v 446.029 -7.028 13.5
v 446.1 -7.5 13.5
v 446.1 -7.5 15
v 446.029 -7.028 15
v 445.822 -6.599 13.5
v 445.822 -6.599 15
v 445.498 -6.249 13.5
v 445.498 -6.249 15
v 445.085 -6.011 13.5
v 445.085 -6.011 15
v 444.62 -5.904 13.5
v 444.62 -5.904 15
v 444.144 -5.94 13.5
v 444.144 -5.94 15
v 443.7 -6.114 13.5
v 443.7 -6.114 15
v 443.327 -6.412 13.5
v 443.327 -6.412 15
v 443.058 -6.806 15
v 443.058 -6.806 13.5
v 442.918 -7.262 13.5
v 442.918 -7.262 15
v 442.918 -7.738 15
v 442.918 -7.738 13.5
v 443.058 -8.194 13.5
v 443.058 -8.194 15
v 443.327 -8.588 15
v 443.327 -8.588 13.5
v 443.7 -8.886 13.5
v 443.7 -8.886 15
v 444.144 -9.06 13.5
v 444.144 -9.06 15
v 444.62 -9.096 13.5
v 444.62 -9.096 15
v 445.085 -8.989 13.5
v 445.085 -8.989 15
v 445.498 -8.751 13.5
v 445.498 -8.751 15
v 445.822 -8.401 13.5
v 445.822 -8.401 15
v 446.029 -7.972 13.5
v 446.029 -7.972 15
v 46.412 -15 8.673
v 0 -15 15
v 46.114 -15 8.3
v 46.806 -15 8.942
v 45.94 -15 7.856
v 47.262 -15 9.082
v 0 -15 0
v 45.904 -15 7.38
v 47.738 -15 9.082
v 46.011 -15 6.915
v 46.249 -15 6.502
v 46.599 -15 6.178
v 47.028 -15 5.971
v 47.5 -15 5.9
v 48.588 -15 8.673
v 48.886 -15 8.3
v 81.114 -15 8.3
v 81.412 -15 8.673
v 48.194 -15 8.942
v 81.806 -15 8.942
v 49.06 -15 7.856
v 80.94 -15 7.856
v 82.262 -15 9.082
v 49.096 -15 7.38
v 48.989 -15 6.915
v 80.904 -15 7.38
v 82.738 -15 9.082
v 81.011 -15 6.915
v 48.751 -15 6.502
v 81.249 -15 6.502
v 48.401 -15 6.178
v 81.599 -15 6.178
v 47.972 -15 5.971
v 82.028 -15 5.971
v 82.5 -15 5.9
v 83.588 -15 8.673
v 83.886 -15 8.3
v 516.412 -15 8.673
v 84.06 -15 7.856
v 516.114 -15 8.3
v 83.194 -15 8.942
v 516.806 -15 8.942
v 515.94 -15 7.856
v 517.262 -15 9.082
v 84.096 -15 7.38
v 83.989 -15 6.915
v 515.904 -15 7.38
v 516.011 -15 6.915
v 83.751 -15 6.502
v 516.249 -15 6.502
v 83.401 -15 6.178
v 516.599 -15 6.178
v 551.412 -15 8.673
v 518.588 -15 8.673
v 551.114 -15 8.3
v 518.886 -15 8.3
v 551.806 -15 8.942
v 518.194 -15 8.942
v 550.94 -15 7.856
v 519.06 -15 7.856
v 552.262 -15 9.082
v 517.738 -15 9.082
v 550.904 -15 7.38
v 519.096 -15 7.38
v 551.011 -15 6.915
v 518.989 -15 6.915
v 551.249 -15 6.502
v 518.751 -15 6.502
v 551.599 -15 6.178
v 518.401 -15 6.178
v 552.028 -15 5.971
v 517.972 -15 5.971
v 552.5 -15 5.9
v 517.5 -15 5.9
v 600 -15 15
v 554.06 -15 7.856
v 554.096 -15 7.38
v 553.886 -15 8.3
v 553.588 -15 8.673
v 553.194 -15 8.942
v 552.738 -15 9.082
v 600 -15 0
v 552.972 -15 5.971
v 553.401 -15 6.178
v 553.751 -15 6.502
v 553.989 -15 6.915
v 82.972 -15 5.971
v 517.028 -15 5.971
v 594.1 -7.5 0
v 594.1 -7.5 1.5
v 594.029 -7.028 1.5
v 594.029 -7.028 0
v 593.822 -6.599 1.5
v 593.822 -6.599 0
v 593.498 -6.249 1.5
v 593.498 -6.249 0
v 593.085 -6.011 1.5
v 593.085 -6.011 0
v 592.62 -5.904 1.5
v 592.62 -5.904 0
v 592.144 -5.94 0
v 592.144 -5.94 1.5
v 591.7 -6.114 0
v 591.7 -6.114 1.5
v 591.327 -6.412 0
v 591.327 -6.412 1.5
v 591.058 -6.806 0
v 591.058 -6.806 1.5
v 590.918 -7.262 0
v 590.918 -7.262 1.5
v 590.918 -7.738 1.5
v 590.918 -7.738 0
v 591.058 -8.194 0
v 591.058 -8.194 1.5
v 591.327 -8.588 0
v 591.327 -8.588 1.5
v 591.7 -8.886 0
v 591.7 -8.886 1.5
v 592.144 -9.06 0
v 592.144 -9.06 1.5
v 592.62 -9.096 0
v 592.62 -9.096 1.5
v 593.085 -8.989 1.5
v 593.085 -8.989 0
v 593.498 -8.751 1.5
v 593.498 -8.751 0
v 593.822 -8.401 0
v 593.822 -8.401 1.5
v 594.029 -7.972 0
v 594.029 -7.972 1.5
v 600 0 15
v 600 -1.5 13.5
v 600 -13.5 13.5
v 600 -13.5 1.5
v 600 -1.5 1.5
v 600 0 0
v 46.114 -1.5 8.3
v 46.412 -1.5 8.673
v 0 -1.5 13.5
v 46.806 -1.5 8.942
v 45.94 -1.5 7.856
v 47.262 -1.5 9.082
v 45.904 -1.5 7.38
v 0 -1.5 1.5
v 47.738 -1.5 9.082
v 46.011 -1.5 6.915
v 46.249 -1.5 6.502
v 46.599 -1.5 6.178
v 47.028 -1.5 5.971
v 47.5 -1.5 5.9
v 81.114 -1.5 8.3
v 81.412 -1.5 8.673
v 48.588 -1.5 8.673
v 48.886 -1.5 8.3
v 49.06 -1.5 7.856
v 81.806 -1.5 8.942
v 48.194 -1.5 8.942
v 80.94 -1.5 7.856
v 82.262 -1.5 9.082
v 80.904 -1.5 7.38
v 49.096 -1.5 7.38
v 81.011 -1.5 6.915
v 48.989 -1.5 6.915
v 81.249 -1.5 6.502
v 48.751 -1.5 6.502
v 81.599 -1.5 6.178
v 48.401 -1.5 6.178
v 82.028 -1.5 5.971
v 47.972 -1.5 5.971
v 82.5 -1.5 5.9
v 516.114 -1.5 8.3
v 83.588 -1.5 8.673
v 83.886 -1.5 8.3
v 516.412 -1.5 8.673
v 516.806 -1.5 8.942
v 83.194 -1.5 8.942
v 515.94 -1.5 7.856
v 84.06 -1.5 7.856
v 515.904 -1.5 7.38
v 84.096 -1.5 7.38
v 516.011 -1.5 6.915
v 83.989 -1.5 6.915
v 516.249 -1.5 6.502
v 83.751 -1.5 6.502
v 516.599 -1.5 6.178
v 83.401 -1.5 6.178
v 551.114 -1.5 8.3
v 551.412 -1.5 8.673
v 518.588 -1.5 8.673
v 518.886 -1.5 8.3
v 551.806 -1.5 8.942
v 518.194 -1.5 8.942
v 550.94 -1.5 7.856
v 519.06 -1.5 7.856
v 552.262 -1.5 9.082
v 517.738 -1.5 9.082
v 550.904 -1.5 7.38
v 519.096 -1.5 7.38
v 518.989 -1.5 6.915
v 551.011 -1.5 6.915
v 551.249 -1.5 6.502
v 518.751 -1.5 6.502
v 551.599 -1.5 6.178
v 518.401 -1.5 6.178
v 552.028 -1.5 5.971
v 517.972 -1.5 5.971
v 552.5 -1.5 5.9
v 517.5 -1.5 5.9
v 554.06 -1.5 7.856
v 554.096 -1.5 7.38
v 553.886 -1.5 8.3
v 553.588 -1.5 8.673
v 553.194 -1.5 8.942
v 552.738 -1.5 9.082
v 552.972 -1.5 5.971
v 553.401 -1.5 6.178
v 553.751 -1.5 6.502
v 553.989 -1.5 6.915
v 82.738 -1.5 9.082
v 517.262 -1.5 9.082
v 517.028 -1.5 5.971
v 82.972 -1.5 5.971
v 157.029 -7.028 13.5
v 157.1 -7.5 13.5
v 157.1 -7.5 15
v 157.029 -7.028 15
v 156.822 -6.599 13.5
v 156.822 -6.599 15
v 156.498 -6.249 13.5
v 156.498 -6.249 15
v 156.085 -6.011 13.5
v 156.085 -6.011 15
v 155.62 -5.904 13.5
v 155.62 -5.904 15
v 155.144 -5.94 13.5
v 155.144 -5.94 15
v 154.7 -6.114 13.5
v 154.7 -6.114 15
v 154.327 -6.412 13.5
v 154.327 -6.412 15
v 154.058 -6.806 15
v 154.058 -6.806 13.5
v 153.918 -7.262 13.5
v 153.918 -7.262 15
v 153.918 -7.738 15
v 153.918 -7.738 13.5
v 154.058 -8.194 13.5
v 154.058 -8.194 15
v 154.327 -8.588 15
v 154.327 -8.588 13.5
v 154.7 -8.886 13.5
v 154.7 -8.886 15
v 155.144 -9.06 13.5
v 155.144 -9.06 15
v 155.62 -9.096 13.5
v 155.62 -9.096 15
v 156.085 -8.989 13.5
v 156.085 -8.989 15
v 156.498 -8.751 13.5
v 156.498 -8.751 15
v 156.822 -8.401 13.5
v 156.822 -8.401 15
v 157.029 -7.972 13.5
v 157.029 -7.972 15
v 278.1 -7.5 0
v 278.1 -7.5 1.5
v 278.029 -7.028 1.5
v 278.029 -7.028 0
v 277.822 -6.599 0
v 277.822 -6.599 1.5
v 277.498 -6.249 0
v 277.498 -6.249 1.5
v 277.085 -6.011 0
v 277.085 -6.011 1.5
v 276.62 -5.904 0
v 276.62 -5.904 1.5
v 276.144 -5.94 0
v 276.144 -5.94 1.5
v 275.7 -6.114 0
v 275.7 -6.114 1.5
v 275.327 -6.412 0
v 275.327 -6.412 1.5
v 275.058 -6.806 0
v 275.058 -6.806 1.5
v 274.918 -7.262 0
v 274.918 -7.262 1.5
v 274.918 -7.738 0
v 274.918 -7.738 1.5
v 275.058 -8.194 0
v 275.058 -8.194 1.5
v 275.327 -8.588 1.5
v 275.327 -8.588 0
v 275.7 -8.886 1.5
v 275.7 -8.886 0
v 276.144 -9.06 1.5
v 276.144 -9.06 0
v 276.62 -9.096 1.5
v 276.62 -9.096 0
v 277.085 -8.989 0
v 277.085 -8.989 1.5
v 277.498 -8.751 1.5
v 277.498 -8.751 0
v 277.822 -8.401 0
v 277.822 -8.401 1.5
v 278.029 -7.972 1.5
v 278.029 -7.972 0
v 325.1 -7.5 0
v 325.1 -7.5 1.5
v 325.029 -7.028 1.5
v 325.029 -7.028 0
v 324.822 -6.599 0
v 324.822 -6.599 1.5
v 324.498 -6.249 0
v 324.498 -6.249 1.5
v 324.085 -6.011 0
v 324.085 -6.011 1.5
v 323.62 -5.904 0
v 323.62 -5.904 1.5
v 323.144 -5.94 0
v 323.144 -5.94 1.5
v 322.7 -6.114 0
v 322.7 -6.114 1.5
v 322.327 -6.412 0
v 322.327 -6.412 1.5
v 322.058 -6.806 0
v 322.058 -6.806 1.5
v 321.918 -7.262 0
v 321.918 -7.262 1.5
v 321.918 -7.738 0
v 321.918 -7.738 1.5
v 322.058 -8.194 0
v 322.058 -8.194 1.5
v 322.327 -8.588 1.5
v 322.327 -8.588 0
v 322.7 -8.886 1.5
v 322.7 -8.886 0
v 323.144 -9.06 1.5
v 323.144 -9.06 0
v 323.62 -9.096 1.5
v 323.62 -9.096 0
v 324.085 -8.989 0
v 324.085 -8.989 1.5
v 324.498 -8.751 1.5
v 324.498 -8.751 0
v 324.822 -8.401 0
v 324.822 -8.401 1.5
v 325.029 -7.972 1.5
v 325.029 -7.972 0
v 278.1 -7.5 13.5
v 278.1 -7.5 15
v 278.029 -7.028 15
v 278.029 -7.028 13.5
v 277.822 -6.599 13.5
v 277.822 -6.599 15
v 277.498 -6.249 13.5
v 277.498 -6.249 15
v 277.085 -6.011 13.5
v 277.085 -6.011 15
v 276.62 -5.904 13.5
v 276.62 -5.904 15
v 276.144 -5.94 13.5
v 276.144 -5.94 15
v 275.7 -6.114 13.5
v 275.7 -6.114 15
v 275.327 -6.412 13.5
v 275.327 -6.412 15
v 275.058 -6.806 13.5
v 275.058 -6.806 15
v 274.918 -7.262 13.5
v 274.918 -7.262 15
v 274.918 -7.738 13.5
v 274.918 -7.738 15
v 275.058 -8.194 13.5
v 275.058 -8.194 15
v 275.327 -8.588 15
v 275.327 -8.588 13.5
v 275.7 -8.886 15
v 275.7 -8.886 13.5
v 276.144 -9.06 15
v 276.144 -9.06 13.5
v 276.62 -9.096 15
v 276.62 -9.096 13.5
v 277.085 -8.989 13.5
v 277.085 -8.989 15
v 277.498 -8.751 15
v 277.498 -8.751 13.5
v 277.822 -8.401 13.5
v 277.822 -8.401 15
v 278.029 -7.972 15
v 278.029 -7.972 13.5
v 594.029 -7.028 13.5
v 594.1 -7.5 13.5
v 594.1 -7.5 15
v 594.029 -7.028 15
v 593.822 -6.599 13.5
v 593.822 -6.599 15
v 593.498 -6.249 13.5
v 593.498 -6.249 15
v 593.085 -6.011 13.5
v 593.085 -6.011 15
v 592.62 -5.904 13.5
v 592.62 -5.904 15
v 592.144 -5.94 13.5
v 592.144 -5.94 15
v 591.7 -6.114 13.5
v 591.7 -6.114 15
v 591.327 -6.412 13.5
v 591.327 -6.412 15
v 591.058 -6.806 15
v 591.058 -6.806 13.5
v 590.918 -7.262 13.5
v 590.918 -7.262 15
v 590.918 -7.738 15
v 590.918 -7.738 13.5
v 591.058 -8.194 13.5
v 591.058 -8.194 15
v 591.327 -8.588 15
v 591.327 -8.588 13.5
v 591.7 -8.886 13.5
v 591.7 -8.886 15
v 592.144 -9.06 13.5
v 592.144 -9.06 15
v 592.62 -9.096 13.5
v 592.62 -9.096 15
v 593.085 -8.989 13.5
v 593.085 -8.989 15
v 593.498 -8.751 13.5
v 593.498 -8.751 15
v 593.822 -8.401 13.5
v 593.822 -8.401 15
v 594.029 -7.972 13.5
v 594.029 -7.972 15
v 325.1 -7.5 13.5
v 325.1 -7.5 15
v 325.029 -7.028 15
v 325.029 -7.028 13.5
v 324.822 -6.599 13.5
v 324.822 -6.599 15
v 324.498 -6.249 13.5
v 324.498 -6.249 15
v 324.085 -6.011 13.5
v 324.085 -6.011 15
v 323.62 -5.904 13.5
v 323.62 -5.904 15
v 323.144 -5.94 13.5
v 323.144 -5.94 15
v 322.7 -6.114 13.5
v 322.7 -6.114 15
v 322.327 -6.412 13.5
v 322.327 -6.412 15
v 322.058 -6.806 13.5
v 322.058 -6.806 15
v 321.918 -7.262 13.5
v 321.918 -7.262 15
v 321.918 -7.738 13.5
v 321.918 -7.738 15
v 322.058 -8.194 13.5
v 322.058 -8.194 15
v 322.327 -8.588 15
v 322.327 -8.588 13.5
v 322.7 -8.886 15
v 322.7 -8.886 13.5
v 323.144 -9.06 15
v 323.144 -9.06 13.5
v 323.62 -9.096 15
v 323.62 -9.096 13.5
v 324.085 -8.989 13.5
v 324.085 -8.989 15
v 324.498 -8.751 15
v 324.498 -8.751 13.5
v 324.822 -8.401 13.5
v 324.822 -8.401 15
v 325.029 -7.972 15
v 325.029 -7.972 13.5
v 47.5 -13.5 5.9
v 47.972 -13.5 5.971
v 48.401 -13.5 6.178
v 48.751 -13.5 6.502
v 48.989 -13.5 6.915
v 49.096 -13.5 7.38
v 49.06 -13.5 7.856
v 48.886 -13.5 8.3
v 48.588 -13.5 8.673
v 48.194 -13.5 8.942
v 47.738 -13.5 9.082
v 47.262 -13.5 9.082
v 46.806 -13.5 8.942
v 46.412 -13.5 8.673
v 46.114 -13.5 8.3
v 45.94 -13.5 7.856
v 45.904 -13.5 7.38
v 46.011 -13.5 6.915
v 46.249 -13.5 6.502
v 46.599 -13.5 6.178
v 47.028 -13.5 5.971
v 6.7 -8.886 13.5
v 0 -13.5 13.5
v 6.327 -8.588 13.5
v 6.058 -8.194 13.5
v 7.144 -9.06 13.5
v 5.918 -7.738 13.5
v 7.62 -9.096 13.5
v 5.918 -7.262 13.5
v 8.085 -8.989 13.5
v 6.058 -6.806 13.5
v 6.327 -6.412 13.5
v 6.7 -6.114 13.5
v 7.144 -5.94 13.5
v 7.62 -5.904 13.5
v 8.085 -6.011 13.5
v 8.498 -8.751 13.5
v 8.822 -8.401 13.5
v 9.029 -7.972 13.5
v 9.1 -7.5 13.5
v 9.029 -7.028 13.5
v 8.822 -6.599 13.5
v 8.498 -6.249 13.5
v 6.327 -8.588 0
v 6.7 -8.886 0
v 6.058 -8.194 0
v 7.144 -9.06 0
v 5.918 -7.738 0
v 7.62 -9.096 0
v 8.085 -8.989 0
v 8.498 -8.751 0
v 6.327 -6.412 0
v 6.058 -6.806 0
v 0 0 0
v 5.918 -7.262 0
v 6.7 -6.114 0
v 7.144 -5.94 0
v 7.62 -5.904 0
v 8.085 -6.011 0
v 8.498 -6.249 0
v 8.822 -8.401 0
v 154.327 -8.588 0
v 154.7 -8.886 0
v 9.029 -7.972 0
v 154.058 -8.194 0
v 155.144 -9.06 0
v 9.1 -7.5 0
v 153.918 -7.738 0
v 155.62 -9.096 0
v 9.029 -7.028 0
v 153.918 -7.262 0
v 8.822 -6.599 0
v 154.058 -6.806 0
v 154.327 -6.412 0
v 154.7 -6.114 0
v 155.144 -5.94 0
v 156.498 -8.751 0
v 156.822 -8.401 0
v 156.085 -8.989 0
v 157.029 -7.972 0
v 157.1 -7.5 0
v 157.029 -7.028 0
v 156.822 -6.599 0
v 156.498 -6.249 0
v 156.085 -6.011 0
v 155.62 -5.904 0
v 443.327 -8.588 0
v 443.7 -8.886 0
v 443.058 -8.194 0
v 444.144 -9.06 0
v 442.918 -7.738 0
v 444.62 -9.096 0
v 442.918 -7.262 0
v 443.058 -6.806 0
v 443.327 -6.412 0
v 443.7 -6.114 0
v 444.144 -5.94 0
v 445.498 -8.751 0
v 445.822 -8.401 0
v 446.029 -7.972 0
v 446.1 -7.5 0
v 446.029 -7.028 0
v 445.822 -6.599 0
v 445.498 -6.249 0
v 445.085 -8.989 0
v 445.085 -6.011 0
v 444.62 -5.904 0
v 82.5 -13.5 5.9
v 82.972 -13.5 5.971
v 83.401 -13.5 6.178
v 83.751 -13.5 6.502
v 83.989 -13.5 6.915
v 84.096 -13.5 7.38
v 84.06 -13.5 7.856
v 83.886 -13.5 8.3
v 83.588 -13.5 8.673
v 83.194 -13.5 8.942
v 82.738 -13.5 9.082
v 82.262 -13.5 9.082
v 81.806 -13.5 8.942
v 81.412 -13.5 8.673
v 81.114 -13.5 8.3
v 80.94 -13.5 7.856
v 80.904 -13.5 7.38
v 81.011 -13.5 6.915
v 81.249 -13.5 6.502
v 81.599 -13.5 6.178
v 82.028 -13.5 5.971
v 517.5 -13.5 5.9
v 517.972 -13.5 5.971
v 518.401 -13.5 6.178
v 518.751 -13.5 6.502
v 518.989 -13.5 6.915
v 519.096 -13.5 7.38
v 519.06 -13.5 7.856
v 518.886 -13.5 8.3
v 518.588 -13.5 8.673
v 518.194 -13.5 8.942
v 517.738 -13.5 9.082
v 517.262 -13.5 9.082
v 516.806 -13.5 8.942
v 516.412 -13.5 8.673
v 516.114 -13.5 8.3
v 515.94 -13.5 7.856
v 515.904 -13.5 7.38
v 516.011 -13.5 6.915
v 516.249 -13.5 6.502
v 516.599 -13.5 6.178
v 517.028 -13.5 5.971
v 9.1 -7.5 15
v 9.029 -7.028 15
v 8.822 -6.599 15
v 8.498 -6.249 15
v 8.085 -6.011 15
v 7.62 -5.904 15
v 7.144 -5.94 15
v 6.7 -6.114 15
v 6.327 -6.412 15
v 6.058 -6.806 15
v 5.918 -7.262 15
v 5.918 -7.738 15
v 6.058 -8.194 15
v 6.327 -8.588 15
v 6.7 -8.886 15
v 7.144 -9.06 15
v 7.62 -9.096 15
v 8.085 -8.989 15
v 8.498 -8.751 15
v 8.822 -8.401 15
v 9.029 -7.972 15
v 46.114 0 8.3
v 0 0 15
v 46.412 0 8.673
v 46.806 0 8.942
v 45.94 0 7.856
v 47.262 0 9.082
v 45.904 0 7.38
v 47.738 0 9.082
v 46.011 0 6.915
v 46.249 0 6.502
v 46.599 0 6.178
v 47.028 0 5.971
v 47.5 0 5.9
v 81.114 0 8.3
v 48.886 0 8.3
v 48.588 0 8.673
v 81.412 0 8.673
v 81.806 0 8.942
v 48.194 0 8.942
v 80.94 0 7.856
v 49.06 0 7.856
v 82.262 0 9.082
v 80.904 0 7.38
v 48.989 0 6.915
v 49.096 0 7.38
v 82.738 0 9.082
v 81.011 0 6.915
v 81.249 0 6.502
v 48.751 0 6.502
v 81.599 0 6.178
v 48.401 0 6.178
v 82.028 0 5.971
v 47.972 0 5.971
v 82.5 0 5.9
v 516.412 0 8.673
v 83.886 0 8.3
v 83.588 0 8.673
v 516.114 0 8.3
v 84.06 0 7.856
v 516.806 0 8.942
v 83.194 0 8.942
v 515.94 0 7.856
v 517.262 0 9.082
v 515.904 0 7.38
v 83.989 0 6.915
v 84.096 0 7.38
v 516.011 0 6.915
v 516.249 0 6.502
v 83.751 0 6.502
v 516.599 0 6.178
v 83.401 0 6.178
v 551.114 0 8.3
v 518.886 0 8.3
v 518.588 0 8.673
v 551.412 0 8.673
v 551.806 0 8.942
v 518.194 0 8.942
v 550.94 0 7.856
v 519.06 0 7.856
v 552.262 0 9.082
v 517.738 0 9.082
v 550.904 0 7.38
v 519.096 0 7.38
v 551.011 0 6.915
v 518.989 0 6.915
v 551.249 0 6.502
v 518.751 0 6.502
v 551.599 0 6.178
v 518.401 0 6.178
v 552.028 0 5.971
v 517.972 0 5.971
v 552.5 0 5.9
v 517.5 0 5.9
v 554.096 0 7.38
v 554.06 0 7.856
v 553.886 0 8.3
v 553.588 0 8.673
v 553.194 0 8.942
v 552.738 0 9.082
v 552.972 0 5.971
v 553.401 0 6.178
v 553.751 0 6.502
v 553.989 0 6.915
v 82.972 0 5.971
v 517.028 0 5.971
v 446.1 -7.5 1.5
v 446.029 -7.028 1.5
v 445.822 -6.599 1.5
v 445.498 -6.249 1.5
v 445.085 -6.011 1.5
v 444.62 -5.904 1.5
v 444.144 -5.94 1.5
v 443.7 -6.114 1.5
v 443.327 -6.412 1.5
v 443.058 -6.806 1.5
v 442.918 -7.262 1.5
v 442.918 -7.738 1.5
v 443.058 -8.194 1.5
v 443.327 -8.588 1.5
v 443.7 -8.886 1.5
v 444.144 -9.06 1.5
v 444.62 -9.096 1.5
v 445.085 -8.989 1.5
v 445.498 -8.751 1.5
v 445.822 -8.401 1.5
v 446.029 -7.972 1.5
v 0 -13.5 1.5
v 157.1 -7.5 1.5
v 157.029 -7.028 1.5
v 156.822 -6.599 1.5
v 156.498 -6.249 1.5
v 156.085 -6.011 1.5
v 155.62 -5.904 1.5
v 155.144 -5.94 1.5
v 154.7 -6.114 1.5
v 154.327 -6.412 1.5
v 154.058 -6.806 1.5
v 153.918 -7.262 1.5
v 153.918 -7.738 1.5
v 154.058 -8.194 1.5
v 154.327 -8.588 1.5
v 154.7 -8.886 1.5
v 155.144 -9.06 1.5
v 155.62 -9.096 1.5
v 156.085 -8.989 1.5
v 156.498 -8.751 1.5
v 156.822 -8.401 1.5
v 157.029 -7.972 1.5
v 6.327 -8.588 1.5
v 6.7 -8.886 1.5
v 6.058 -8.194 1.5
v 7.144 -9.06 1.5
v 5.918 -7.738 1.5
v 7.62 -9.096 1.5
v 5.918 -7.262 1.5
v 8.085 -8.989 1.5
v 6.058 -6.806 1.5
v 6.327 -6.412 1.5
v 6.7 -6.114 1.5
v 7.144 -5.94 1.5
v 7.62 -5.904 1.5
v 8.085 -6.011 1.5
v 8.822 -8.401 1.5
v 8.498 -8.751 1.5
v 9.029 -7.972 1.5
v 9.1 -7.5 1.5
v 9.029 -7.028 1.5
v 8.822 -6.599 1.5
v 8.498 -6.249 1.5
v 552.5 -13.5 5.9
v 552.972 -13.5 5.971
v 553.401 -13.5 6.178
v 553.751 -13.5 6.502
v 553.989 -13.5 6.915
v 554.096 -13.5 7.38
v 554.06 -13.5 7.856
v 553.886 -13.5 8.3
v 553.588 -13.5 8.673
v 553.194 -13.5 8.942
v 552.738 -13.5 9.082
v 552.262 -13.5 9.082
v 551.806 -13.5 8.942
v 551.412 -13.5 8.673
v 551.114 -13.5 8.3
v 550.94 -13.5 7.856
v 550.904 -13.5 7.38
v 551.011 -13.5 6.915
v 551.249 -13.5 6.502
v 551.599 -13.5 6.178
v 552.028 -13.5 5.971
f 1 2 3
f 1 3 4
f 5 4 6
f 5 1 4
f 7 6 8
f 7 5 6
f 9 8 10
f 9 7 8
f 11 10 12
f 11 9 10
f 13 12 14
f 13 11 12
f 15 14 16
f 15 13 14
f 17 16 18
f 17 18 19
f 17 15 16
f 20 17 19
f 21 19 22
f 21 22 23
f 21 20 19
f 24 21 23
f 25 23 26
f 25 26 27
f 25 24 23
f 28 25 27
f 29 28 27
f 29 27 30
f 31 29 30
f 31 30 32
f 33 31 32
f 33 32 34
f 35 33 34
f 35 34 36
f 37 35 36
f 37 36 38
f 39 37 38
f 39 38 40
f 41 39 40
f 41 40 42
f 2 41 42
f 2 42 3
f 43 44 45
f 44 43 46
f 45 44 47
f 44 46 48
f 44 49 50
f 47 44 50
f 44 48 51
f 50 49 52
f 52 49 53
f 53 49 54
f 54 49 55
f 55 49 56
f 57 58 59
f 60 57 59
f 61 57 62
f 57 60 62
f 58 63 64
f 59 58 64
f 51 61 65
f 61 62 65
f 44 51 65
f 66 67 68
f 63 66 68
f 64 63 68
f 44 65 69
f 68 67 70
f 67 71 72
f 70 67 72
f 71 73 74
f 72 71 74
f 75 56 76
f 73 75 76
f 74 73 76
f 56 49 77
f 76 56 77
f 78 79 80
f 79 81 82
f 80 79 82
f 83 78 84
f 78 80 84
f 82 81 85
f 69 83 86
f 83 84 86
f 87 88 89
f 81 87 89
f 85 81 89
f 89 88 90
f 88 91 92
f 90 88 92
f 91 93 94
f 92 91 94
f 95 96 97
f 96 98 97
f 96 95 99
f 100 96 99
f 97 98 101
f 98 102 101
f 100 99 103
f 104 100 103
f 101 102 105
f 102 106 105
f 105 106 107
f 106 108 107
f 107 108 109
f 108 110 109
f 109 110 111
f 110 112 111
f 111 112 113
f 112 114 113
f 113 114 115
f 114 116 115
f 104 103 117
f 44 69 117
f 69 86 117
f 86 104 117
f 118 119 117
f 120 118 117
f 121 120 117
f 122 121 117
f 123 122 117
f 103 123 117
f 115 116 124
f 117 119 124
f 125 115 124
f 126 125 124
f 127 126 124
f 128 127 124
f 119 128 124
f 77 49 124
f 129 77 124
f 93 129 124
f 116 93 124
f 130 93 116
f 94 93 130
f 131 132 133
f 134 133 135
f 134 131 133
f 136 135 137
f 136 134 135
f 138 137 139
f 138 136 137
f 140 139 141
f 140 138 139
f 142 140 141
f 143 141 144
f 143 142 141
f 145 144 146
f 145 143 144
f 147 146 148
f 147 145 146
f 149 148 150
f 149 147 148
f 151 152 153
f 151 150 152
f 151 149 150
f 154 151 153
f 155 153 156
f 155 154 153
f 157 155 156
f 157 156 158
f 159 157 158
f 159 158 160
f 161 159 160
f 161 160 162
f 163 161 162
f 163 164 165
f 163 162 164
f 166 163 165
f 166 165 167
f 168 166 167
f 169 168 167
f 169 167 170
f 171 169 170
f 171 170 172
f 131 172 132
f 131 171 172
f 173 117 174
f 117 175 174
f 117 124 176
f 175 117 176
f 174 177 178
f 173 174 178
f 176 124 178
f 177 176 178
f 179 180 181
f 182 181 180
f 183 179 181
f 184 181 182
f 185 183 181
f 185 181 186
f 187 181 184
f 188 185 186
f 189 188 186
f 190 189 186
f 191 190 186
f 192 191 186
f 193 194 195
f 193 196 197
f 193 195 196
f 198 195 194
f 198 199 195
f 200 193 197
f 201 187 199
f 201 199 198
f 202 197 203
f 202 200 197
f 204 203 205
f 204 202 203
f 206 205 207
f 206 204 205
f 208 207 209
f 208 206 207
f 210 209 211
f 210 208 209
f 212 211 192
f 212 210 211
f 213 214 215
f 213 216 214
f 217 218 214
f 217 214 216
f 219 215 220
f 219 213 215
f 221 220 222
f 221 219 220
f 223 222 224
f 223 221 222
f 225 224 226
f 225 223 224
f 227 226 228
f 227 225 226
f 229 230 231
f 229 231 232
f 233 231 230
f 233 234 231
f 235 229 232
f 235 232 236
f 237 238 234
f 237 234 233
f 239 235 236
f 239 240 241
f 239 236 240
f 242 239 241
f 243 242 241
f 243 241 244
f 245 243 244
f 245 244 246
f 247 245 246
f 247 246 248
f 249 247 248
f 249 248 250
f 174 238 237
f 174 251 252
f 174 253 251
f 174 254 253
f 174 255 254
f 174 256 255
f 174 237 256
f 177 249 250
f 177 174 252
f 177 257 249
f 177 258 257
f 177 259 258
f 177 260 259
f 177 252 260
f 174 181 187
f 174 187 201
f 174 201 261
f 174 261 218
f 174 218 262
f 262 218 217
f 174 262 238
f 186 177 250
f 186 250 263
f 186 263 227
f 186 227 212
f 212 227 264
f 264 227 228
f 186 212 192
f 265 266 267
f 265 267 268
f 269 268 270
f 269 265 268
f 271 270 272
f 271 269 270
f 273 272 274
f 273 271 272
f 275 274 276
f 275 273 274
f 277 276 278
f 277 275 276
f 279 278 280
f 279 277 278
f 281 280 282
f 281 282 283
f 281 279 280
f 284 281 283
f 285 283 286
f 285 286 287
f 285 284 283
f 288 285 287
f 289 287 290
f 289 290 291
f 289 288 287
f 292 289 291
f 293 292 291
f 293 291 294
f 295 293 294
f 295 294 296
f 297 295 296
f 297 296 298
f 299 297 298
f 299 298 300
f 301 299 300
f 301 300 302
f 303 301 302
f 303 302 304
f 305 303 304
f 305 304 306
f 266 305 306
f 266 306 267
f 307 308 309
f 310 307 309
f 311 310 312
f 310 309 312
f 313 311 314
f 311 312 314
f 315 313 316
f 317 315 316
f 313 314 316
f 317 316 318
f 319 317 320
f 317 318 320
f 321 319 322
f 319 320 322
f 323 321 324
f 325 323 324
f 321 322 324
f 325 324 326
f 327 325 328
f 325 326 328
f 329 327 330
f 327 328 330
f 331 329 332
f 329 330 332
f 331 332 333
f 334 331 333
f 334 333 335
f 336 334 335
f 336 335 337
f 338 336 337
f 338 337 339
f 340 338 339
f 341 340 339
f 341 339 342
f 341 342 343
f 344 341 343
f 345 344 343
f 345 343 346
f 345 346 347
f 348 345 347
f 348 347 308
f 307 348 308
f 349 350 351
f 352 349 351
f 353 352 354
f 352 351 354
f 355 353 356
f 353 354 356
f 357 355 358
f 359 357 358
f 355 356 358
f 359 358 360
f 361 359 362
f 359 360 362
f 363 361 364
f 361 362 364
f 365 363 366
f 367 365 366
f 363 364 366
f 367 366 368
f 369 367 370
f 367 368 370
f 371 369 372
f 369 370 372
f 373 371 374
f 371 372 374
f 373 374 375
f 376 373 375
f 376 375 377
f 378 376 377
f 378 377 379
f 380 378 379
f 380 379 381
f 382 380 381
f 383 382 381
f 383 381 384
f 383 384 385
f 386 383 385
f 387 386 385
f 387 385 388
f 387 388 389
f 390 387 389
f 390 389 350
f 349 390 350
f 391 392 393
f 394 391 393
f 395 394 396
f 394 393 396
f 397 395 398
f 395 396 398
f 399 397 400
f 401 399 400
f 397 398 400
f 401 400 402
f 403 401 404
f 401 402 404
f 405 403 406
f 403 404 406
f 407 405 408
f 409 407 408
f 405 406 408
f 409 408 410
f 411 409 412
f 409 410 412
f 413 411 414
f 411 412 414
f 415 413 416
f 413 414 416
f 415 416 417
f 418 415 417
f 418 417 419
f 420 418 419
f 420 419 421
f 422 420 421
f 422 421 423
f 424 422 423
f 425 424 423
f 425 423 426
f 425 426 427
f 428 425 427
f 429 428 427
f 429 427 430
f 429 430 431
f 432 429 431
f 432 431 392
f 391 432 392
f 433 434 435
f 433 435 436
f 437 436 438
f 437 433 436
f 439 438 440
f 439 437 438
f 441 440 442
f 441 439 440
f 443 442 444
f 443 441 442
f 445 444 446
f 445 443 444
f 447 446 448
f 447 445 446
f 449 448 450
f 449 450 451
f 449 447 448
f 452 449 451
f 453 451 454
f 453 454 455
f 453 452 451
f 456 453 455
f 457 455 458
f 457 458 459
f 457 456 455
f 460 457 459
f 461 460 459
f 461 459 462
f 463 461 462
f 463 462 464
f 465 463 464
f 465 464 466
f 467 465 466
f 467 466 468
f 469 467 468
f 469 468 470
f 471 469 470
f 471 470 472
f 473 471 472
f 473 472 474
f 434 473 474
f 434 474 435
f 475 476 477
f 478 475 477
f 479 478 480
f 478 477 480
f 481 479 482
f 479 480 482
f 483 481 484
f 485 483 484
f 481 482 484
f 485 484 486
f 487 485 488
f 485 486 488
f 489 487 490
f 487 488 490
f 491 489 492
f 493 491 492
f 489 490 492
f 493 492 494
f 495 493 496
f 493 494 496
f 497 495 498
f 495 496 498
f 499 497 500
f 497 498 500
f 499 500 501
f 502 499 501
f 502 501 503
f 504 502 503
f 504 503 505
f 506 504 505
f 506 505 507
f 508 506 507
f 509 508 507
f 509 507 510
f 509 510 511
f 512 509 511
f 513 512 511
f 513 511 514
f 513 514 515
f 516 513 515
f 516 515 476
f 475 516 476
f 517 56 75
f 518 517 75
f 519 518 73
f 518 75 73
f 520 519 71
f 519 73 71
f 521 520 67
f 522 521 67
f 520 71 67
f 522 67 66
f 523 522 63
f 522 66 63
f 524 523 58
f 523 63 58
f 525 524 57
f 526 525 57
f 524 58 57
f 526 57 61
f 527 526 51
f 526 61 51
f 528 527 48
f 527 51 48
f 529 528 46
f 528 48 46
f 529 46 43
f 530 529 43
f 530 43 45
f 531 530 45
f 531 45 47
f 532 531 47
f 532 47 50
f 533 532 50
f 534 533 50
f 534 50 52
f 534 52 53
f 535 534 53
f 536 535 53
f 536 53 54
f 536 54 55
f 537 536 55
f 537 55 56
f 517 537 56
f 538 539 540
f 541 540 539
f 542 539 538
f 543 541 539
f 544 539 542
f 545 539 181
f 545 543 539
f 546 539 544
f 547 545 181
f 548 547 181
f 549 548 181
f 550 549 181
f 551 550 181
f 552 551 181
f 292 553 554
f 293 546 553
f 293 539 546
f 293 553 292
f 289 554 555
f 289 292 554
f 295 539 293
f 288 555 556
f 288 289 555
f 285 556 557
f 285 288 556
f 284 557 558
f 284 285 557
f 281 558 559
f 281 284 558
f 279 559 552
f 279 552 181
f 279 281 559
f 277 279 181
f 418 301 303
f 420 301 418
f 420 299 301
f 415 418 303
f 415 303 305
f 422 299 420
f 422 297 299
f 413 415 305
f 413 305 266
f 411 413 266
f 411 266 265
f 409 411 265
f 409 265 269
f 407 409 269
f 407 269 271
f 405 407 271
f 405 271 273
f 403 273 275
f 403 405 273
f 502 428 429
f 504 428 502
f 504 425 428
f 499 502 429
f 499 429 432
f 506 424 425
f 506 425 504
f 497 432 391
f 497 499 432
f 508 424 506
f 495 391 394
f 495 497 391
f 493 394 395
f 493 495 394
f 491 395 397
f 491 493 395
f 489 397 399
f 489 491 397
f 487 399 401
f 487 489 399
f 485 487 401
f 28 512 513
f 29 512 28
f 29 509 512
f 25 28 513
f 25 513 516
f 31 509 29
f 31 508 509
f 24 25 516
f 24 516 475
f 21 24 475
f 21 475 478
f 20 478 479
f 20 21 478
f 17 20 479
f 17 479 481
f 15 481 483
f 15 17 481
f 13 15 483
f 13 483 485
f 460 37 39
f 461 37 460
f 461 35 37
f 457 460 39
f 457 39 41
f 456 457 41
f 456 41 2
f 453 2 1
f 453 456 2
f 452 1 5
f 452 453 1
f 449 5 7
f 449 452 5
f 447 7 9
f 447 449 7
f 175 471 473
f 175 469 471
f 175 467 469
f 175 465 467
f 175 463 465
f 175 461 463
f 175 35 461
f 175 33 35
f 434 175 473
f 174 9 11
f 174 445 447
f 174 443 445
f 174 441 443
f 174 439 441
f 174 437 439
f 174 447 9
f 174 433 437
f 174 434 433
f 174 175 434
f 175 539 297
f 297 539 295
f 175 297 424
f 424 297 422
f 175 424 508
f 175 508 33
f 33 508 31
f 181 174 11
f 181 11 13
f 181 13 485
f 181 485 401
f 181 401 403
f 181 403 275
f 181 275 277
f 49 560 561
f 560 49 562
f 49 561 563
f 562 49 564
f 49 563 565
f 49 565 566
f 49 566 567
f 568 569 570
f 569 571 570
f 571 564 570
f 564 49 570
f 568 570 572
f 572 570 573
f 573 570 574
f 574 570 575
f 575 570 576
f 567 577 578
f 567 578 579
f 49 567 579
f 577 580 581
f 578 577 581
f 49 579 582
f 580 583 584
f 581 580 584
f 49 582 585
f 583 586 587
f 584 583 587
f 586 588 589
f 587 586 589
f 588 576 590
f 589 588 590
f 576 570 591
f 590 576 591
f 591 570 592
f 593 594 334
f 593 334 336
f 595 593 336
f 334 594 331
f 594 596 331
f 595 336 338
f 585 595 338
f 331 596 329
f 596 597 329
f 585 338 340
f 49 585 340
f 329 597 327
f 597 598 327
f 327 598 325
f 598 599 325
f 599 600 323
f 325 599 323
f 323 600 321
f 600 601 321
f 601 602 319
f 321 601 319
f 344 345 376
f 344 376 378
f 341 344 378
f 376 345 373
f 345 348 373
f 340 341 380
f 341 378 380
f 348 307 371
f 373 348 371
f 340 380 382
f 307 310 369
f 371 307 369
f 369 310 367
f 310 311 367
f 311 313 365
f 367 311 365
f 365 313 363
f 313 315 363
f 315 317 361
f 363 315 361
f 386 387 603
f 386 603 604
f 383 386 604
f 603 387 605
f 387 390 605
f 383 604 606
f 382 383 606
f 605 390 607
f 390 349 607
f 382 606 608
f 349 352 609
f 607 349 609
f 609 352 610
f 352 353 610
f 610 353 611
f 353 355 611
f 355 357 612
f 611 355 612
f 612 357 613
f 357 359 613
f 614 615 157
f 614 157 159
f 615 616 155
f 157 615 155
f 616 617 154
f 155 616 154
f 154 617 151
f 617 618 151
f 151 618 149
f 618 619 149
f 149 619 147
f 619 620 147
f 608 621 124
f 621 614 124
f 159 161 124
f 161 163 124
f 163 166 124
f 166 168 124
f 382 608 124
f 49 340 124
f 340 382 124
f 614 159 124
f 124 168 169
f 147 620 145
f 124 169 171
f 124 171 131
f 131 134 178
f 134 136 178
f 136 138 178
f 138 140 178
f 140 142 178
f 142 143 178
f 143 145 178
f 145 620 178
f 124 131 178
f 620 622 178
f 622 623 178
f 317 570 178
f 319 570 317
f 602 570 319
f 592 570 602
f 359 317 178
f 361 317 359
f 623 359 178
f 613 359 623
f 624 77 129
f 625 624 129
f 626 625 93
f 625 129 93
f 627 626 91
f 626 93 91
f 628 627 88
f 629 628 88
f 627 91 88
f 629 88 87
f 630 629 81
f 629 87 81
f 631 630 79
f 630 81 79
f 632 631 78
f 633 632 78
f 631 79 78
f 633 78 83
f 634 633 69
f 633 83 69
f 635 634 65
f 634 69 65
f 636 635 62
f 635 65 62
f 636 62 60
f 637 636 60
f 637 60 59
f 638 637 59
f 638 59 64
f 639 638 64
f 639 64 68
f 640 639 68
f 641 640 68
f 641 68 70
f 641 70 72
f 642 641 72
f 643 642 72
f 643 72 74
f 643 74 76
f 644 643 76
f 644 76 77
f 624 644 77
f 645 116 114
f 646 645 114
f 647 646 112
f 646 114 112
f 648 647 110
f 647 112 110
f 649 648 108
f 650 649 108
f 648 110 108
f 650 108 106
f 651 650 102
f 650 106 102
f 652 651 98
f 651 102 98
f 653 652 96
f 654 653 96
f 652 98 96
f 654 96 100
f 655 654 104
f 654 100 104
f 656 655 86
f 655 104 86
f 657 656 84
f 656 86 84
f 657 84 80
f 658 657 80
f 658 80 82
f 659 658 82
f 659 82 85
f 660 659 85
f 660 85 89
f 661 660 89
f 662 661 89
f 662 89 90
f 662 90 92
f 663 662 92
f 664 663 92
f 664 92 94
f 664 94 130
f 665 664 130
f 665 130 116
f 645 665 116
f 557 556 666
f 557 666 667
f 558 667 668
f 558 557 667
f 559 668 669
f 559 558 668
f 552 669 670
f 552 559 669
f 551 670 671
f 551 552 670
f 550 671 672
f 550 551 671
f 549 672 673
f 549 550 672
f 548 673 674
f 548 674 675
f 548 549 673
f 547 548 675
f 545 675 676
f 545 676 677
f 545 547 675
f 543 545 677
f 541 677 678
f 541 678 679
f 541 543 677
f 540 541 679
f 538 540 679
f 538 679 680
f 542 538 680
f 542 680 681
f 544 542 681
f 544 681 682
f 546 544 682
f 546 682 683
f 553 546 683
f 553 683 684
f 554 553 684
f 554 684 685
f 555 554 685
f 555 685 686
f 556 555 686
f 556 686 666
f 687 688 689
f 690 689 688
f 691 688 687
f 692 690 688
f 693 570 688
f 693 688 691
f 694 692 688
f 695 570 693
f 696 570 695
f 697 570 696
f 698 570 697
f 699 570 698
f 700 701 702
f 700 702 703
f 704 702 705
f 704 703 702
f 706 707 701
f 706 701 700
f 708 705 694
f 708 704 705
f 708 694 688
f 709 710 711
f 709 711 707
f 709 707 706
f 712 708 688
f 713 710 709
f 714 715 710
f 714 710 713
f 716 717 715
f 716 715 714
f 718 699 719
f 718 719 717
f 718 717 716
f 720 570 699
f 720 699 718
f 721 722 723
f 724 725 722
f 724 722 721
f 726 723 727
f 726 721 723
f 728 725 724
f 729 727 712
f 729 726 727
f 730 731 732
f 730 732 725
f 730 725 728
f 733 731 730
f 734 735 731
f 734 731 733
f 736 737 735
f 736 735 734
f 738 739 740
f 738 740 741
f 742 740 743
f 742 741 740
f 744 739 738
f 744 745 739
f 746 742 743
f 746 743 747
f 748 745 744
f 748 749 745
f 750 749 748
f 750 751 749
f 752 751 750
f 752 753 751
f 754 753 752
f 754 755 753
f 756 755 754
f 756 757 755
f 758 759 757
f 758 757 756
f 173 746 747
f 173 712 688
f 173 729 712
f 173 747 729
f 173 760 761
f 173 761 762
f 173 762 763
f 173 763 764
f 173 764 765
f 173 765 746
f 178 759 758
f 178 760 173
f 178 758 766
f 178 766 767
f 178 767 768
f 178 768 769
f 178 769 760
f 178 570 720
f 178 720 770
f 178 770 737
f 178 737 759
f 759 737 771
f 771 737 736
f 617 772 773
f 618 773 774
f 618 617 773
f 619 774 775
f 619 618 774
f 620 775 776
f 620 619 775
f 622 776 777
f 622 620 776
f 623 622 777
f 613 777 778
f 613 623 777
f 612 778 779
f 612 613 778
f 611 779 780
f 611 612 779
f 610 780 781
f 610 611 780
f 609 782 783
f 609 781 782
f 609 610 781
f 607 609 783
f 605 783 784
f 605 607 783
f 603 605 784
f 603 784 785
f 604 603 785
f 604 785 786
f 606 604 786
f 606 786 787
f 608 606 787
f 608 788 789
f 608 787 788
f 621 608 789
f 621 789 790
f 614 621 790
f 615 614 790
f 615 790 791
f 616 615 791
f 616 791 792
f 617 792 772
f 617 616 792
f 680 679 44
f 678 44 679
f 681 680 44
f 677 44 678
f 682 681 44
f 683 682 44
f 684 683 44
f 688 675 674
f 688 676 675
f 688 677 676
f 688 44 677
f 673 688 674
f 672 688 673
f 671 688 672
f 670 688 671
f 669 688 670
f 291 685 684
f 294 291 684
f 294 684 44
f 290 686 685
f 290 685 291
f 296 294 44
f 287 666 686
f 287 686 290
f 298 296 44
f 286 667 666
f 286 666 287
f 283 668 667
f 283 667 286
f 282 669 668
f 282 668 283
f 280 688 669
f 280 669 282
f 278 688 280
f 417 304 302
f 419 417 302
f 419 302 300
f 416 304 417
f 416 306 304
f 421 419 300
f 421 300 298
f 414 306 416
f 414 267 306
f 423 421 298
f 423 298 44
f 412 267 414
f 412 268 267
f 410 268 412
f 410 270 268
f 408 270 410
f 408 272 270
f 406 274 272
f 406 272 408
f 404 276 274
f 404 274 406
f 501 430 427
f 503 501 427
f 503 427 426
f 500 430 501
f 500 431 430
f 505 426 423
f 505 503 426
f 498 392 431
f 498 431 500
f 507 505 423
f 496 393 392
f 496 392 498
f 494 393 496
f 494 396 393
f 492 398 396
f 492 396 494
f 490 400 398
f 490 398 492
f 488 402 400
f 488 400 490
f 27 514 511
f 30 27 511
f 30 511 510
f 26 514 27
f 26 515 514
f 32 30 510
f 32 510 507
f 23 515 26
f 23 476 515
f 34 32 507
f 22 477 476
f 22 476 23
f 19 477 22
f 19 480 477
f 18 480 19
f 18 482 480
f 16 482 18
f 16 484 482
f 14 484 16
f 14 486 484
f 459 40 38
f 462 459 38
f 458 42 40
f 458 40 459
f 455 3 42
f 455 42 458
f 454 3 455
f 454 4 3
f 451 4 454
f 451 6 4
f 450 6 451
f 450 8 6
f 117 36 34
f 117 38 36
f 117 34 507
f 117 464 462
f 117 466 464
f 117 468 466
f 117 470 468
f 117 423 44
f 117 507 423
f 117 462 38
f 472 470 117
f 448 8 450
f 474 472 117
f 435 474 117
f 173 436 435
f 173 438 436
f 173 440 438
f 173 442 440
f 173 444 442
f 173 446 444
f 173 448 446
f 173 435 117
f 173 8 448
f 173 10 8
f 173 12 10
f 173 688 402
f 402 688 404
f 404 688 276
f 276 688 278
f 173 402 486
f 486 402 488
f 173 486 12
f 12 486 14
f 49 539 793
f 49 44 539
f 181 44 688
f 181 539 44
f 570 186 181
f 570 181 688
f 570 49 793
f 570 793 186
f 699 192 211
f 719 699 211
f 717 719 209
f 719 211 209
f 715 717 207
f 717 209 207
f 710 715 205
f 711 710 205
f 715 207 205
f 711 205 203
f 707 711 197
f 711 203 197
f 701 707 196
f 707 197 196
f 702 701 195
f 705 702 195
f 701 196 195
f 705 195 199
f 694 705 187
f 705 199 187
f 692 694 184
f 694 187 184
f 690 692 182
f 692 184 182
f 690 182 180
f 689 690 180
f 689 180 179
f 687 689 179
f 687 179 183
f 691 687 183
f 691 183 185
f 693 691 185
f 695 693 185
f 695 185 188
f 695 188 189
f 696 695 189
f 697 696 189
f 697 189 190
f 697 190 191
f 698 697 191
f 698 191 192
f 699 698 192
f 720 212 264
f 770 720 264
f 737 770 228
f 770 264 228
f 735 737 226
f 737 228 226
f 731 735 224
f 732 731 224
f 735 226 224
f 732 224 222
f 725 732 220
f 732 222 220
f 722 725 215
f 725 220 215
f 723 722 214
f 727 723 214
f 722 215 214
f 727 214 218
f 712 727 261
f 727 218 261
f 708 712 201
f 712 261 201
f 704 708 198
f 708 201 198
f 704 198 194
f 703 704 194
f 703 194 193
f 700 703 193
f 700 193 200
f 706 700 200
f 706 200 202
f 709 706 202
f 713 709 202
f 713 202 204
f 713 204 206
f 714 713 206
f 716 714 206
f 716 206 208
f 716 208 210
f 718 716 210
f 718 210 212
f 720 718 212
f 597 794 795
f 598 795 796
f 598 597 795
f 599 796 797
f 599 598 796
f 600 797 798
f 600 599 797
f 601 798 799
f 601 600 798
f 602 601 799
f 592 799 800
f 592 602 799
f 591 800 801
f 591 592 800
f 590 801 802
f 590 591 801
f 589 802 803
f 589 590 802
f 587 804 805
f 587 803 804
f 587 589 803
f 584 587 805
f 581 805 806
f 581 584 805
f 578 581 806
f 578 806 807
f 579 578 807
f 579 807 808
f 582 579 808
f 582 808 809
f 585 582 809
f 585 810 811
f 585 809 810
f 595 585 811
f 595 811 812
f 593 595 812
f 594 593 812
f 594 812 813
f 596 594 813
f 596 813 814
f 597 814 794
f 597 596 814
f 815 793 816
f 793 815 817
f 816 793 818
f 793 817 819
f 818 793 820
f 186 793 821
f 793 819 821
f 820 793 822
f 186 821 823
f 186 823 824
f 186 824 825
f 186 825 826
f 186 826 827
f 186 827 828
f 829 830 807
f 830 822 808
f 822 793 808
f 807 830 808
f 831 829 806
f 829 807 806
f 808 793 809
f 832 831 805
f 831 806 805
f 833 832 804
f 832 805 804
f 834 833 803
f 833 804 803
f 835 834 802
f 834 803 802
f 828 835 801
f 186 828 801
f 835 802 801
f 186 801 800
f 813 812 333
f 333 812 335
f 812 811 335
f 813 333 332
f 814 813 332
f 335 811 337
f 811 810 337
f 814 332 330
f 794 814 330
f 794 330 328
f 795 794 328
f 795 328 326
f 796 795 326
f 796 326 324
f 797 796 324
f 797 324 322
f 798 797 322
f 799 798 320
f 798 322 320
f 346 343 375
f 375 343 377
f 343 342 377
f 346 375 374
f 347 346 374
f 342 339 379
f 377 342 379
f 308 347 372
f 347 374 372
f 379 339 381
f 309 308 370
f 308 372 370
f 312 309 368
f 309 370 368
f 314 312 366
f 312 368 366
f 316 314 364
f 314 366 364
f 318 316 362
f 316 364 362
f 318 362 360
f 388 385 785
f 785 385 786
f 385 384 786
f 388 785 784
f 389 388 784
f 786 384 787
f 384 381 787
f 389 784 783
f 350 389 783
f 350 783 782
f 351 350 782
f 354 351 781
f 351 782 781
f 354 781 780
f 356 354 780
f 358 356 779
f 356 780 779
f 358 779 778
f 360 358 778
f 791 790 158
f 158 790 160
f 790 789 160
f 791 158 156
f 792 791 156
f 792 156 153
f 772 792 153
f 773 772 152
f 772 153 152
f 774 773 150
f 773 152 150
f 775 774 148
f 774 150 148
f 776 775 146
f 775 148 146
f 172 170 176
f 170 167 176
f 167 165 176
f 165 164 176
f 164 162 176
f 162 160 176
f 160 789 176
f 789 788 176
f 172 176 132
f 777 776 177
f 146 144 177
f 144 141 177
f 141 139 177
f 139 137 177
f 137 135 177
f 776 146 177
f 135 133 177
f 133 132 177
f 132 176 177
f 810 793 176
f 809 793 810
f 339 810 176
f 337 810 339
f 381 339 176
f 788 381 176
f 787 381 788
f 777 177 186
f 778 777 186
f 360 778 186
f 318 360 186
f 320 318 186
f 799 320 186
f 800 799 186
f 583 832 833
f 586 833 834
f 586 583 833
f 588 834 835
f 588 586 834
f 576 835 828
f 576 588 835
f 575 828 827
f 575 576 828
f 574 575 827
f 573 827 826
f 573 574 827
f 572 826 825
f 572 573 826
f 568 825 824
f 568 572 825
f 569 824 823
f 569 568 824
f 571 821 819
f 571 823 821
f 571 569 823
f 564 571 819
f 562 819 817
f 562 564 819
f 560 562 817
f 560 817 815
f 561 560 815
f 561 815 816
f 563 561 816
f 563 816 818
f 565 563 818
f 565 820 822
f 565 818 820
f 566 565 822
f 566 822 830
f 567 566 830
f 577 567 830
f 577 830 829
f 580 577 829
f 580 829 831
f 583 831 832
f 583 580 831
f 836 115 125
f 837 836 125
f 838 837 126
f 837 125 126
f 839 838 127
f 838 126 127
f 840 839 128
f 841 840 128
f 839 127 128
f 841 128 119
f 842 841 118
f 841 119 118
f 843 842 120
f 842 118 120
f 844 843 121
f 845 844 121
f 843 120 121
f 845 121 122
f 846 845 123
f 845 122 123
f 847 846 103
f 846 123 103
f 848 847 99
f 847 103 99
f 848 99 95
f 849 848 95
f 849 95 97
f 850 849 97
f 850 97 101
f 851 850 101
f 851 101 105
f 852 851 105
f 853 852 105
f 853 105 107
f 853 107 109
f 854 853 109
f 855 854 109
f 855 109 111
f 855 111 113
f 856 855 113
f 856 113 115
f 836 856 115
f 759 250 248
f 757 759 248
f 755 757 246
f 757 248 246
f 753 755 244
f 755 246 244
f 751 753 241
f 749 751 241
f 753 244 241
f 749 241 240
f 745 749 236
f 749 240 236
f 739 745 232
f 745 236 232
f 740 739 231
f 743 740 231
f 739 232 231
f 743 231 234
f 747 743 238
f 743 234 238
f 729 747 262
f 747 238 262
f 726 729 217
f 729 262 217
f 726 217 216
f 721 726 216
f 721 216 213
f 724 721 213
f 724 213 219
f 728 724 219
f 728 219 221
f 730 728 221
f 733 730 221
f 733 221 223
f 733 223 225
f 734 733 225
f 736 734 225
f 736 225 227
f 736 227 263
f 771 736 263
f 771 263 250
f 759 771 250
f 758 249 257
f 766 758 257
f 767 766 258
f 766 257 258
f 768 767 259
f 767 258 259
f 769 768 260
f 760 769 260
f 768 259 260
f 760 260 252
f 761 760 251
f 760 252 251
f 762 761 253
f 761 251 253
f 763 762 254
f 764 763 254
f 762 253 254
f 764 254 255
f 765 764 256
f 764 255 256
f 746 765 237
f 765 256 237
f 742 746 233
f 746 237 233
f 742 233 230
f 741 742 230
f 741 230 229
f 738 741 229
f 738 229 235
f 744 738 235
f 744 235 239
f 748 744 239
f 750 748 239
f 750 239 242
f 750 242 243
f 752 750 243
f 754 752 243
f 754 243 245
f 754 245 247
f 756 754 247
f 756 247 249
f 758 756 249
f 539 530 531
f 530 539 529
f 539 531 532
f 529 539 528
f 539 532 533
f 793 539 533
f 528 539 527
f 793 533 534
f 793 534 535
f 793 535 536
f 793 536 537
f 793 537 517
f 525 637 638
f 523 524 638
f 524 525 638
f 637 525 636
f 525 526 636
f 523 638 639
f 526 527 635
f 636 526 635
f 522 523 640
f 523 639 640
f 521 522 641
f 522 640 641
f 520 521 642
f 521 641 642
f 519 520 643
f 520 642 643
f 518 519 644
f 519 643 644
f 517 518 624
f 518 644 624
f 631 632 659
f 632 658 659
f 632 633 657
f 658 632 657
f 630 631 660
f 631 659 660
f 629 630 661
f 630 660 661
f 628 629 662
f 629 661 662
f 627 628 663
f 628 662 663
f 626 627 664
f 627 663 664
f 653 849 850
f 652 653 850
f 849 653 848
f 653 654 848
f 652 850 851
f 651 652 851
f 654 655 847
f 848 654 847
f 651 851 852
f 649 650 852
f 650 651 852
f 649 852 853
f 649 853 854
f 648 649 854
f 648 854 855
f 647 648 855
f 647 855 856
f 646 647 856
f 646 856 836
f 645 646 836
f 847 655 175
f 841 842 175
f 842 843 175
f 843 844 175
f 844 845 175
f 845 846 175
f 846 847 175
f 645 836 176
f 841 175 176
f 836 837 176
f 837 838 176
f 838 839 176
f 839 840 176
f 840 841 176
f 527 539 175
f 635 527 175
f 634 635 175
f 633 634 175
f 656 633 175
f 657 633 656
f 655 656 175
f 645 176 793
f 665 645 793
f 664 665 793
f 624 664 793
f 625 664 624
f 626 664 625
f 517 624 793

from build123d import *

# Parameters (mm, degrees)
SKETCH_2_W          = 600
SKETCH_2_H          = 15
SKETCH_2_R          = 1.6
EXTRUDE_1_DEPTH     = 15
SKETCH_3_W          = 12
SKETCH_3_H          = 12
CUT_EXTRUDE_1_DEPTH = 601.374882886
SKETCH_5_R          = 1.6
CUT_EXTRUDE_3_DEPTH = 601.374882886
SKETCH_6_R          = 1.6
CUT_EXTRUDE_4_DEPTH = 601.374882886


with BuildPart() as part:
    # ｽｹｯﾁ2 → ﾎﾞｽ - 押し出し1 (new body)
    with BuildSketch(Plane.XY):
        with Locations((300, -7.5)):
            Rectangle(SKETCH_2_W, SKETCH_2_H)
        with Locations((7.5, -7.5)):
            Circle(SKETCH_2_R, mode=Mode.SUBTRACT)
        with Locations((155.5, -7.5)):
            Circle(SKETCH_2_R, mode=Mode.SUBTRACT)
        with Locations((444.5, -7.5)):
            Circle(SKETCH_2_R, mode=Mode.SUBTRACT)
        with Locations((592.5, -7.5)):
            Circle(SKETCH_2_R, mode=Mode.SUBTRACT)
    extrude(amount=EXTRUDE_1_DEPTH)

    # ｽｹｯﾁ3 → ｶｯﾄ - 押し出し1 (cut, through all)
    with BuildSketch(Plane(origin=(600, 0, 0), x_dir=(0, 0, -1), z_dir=(1, 0, 0))):
        with Locations((-7.5, -7.5)):
            Rectangle(SKETCH_3_W, SKETCH_3_H)
    extrude(amount=-CUT_EXTRUDE_1_DEPTH, mode=Mode.SUBTRACT)

    # ｽｹｯﾁ5 → ｶｯﾄ - 押し出し3 (cut, through all)
    with BuildSketch(Plane.XZ.offset(15)):
        with Locations(Location((552.5, 7.5, 0), (0, 0, 270))):
            Circle(SKETCH_5_R)
        with Locations(Location((517.5, 7.5, 0), (0, 0, 270))):
            Circle(SKETCH_5_R)
        with Locations(Location((47.5, 7.5, 0), (0, 0, 270))):
            Circle(SKETCH_5_R)
        with Locations(Location((82.5, 7.5, 0), (0, 0, 270))):
            Circle(SKETCH_5_R)
    extrude(amount=-CUT_EXTRUDE_3_DEPTH, mode=Mode.SUBTRACT)

    # ｽｹｯﾁ6 → ｶｯﾄ - 押し出し4 (cut, through all)
    with BuildSketch(Plane.XY.offset(15)):
        with Locations((276.5, -7.5)):
            Circle(SKETCH_6_R)
        with Locations((323.5, -7.5)):
            Circle(SKETCH_6_R)
    extrude(amount=-CUT_EXTRUDE_4_DEPTH, mode=Mode.SUBTRACT)


solid = part.part
